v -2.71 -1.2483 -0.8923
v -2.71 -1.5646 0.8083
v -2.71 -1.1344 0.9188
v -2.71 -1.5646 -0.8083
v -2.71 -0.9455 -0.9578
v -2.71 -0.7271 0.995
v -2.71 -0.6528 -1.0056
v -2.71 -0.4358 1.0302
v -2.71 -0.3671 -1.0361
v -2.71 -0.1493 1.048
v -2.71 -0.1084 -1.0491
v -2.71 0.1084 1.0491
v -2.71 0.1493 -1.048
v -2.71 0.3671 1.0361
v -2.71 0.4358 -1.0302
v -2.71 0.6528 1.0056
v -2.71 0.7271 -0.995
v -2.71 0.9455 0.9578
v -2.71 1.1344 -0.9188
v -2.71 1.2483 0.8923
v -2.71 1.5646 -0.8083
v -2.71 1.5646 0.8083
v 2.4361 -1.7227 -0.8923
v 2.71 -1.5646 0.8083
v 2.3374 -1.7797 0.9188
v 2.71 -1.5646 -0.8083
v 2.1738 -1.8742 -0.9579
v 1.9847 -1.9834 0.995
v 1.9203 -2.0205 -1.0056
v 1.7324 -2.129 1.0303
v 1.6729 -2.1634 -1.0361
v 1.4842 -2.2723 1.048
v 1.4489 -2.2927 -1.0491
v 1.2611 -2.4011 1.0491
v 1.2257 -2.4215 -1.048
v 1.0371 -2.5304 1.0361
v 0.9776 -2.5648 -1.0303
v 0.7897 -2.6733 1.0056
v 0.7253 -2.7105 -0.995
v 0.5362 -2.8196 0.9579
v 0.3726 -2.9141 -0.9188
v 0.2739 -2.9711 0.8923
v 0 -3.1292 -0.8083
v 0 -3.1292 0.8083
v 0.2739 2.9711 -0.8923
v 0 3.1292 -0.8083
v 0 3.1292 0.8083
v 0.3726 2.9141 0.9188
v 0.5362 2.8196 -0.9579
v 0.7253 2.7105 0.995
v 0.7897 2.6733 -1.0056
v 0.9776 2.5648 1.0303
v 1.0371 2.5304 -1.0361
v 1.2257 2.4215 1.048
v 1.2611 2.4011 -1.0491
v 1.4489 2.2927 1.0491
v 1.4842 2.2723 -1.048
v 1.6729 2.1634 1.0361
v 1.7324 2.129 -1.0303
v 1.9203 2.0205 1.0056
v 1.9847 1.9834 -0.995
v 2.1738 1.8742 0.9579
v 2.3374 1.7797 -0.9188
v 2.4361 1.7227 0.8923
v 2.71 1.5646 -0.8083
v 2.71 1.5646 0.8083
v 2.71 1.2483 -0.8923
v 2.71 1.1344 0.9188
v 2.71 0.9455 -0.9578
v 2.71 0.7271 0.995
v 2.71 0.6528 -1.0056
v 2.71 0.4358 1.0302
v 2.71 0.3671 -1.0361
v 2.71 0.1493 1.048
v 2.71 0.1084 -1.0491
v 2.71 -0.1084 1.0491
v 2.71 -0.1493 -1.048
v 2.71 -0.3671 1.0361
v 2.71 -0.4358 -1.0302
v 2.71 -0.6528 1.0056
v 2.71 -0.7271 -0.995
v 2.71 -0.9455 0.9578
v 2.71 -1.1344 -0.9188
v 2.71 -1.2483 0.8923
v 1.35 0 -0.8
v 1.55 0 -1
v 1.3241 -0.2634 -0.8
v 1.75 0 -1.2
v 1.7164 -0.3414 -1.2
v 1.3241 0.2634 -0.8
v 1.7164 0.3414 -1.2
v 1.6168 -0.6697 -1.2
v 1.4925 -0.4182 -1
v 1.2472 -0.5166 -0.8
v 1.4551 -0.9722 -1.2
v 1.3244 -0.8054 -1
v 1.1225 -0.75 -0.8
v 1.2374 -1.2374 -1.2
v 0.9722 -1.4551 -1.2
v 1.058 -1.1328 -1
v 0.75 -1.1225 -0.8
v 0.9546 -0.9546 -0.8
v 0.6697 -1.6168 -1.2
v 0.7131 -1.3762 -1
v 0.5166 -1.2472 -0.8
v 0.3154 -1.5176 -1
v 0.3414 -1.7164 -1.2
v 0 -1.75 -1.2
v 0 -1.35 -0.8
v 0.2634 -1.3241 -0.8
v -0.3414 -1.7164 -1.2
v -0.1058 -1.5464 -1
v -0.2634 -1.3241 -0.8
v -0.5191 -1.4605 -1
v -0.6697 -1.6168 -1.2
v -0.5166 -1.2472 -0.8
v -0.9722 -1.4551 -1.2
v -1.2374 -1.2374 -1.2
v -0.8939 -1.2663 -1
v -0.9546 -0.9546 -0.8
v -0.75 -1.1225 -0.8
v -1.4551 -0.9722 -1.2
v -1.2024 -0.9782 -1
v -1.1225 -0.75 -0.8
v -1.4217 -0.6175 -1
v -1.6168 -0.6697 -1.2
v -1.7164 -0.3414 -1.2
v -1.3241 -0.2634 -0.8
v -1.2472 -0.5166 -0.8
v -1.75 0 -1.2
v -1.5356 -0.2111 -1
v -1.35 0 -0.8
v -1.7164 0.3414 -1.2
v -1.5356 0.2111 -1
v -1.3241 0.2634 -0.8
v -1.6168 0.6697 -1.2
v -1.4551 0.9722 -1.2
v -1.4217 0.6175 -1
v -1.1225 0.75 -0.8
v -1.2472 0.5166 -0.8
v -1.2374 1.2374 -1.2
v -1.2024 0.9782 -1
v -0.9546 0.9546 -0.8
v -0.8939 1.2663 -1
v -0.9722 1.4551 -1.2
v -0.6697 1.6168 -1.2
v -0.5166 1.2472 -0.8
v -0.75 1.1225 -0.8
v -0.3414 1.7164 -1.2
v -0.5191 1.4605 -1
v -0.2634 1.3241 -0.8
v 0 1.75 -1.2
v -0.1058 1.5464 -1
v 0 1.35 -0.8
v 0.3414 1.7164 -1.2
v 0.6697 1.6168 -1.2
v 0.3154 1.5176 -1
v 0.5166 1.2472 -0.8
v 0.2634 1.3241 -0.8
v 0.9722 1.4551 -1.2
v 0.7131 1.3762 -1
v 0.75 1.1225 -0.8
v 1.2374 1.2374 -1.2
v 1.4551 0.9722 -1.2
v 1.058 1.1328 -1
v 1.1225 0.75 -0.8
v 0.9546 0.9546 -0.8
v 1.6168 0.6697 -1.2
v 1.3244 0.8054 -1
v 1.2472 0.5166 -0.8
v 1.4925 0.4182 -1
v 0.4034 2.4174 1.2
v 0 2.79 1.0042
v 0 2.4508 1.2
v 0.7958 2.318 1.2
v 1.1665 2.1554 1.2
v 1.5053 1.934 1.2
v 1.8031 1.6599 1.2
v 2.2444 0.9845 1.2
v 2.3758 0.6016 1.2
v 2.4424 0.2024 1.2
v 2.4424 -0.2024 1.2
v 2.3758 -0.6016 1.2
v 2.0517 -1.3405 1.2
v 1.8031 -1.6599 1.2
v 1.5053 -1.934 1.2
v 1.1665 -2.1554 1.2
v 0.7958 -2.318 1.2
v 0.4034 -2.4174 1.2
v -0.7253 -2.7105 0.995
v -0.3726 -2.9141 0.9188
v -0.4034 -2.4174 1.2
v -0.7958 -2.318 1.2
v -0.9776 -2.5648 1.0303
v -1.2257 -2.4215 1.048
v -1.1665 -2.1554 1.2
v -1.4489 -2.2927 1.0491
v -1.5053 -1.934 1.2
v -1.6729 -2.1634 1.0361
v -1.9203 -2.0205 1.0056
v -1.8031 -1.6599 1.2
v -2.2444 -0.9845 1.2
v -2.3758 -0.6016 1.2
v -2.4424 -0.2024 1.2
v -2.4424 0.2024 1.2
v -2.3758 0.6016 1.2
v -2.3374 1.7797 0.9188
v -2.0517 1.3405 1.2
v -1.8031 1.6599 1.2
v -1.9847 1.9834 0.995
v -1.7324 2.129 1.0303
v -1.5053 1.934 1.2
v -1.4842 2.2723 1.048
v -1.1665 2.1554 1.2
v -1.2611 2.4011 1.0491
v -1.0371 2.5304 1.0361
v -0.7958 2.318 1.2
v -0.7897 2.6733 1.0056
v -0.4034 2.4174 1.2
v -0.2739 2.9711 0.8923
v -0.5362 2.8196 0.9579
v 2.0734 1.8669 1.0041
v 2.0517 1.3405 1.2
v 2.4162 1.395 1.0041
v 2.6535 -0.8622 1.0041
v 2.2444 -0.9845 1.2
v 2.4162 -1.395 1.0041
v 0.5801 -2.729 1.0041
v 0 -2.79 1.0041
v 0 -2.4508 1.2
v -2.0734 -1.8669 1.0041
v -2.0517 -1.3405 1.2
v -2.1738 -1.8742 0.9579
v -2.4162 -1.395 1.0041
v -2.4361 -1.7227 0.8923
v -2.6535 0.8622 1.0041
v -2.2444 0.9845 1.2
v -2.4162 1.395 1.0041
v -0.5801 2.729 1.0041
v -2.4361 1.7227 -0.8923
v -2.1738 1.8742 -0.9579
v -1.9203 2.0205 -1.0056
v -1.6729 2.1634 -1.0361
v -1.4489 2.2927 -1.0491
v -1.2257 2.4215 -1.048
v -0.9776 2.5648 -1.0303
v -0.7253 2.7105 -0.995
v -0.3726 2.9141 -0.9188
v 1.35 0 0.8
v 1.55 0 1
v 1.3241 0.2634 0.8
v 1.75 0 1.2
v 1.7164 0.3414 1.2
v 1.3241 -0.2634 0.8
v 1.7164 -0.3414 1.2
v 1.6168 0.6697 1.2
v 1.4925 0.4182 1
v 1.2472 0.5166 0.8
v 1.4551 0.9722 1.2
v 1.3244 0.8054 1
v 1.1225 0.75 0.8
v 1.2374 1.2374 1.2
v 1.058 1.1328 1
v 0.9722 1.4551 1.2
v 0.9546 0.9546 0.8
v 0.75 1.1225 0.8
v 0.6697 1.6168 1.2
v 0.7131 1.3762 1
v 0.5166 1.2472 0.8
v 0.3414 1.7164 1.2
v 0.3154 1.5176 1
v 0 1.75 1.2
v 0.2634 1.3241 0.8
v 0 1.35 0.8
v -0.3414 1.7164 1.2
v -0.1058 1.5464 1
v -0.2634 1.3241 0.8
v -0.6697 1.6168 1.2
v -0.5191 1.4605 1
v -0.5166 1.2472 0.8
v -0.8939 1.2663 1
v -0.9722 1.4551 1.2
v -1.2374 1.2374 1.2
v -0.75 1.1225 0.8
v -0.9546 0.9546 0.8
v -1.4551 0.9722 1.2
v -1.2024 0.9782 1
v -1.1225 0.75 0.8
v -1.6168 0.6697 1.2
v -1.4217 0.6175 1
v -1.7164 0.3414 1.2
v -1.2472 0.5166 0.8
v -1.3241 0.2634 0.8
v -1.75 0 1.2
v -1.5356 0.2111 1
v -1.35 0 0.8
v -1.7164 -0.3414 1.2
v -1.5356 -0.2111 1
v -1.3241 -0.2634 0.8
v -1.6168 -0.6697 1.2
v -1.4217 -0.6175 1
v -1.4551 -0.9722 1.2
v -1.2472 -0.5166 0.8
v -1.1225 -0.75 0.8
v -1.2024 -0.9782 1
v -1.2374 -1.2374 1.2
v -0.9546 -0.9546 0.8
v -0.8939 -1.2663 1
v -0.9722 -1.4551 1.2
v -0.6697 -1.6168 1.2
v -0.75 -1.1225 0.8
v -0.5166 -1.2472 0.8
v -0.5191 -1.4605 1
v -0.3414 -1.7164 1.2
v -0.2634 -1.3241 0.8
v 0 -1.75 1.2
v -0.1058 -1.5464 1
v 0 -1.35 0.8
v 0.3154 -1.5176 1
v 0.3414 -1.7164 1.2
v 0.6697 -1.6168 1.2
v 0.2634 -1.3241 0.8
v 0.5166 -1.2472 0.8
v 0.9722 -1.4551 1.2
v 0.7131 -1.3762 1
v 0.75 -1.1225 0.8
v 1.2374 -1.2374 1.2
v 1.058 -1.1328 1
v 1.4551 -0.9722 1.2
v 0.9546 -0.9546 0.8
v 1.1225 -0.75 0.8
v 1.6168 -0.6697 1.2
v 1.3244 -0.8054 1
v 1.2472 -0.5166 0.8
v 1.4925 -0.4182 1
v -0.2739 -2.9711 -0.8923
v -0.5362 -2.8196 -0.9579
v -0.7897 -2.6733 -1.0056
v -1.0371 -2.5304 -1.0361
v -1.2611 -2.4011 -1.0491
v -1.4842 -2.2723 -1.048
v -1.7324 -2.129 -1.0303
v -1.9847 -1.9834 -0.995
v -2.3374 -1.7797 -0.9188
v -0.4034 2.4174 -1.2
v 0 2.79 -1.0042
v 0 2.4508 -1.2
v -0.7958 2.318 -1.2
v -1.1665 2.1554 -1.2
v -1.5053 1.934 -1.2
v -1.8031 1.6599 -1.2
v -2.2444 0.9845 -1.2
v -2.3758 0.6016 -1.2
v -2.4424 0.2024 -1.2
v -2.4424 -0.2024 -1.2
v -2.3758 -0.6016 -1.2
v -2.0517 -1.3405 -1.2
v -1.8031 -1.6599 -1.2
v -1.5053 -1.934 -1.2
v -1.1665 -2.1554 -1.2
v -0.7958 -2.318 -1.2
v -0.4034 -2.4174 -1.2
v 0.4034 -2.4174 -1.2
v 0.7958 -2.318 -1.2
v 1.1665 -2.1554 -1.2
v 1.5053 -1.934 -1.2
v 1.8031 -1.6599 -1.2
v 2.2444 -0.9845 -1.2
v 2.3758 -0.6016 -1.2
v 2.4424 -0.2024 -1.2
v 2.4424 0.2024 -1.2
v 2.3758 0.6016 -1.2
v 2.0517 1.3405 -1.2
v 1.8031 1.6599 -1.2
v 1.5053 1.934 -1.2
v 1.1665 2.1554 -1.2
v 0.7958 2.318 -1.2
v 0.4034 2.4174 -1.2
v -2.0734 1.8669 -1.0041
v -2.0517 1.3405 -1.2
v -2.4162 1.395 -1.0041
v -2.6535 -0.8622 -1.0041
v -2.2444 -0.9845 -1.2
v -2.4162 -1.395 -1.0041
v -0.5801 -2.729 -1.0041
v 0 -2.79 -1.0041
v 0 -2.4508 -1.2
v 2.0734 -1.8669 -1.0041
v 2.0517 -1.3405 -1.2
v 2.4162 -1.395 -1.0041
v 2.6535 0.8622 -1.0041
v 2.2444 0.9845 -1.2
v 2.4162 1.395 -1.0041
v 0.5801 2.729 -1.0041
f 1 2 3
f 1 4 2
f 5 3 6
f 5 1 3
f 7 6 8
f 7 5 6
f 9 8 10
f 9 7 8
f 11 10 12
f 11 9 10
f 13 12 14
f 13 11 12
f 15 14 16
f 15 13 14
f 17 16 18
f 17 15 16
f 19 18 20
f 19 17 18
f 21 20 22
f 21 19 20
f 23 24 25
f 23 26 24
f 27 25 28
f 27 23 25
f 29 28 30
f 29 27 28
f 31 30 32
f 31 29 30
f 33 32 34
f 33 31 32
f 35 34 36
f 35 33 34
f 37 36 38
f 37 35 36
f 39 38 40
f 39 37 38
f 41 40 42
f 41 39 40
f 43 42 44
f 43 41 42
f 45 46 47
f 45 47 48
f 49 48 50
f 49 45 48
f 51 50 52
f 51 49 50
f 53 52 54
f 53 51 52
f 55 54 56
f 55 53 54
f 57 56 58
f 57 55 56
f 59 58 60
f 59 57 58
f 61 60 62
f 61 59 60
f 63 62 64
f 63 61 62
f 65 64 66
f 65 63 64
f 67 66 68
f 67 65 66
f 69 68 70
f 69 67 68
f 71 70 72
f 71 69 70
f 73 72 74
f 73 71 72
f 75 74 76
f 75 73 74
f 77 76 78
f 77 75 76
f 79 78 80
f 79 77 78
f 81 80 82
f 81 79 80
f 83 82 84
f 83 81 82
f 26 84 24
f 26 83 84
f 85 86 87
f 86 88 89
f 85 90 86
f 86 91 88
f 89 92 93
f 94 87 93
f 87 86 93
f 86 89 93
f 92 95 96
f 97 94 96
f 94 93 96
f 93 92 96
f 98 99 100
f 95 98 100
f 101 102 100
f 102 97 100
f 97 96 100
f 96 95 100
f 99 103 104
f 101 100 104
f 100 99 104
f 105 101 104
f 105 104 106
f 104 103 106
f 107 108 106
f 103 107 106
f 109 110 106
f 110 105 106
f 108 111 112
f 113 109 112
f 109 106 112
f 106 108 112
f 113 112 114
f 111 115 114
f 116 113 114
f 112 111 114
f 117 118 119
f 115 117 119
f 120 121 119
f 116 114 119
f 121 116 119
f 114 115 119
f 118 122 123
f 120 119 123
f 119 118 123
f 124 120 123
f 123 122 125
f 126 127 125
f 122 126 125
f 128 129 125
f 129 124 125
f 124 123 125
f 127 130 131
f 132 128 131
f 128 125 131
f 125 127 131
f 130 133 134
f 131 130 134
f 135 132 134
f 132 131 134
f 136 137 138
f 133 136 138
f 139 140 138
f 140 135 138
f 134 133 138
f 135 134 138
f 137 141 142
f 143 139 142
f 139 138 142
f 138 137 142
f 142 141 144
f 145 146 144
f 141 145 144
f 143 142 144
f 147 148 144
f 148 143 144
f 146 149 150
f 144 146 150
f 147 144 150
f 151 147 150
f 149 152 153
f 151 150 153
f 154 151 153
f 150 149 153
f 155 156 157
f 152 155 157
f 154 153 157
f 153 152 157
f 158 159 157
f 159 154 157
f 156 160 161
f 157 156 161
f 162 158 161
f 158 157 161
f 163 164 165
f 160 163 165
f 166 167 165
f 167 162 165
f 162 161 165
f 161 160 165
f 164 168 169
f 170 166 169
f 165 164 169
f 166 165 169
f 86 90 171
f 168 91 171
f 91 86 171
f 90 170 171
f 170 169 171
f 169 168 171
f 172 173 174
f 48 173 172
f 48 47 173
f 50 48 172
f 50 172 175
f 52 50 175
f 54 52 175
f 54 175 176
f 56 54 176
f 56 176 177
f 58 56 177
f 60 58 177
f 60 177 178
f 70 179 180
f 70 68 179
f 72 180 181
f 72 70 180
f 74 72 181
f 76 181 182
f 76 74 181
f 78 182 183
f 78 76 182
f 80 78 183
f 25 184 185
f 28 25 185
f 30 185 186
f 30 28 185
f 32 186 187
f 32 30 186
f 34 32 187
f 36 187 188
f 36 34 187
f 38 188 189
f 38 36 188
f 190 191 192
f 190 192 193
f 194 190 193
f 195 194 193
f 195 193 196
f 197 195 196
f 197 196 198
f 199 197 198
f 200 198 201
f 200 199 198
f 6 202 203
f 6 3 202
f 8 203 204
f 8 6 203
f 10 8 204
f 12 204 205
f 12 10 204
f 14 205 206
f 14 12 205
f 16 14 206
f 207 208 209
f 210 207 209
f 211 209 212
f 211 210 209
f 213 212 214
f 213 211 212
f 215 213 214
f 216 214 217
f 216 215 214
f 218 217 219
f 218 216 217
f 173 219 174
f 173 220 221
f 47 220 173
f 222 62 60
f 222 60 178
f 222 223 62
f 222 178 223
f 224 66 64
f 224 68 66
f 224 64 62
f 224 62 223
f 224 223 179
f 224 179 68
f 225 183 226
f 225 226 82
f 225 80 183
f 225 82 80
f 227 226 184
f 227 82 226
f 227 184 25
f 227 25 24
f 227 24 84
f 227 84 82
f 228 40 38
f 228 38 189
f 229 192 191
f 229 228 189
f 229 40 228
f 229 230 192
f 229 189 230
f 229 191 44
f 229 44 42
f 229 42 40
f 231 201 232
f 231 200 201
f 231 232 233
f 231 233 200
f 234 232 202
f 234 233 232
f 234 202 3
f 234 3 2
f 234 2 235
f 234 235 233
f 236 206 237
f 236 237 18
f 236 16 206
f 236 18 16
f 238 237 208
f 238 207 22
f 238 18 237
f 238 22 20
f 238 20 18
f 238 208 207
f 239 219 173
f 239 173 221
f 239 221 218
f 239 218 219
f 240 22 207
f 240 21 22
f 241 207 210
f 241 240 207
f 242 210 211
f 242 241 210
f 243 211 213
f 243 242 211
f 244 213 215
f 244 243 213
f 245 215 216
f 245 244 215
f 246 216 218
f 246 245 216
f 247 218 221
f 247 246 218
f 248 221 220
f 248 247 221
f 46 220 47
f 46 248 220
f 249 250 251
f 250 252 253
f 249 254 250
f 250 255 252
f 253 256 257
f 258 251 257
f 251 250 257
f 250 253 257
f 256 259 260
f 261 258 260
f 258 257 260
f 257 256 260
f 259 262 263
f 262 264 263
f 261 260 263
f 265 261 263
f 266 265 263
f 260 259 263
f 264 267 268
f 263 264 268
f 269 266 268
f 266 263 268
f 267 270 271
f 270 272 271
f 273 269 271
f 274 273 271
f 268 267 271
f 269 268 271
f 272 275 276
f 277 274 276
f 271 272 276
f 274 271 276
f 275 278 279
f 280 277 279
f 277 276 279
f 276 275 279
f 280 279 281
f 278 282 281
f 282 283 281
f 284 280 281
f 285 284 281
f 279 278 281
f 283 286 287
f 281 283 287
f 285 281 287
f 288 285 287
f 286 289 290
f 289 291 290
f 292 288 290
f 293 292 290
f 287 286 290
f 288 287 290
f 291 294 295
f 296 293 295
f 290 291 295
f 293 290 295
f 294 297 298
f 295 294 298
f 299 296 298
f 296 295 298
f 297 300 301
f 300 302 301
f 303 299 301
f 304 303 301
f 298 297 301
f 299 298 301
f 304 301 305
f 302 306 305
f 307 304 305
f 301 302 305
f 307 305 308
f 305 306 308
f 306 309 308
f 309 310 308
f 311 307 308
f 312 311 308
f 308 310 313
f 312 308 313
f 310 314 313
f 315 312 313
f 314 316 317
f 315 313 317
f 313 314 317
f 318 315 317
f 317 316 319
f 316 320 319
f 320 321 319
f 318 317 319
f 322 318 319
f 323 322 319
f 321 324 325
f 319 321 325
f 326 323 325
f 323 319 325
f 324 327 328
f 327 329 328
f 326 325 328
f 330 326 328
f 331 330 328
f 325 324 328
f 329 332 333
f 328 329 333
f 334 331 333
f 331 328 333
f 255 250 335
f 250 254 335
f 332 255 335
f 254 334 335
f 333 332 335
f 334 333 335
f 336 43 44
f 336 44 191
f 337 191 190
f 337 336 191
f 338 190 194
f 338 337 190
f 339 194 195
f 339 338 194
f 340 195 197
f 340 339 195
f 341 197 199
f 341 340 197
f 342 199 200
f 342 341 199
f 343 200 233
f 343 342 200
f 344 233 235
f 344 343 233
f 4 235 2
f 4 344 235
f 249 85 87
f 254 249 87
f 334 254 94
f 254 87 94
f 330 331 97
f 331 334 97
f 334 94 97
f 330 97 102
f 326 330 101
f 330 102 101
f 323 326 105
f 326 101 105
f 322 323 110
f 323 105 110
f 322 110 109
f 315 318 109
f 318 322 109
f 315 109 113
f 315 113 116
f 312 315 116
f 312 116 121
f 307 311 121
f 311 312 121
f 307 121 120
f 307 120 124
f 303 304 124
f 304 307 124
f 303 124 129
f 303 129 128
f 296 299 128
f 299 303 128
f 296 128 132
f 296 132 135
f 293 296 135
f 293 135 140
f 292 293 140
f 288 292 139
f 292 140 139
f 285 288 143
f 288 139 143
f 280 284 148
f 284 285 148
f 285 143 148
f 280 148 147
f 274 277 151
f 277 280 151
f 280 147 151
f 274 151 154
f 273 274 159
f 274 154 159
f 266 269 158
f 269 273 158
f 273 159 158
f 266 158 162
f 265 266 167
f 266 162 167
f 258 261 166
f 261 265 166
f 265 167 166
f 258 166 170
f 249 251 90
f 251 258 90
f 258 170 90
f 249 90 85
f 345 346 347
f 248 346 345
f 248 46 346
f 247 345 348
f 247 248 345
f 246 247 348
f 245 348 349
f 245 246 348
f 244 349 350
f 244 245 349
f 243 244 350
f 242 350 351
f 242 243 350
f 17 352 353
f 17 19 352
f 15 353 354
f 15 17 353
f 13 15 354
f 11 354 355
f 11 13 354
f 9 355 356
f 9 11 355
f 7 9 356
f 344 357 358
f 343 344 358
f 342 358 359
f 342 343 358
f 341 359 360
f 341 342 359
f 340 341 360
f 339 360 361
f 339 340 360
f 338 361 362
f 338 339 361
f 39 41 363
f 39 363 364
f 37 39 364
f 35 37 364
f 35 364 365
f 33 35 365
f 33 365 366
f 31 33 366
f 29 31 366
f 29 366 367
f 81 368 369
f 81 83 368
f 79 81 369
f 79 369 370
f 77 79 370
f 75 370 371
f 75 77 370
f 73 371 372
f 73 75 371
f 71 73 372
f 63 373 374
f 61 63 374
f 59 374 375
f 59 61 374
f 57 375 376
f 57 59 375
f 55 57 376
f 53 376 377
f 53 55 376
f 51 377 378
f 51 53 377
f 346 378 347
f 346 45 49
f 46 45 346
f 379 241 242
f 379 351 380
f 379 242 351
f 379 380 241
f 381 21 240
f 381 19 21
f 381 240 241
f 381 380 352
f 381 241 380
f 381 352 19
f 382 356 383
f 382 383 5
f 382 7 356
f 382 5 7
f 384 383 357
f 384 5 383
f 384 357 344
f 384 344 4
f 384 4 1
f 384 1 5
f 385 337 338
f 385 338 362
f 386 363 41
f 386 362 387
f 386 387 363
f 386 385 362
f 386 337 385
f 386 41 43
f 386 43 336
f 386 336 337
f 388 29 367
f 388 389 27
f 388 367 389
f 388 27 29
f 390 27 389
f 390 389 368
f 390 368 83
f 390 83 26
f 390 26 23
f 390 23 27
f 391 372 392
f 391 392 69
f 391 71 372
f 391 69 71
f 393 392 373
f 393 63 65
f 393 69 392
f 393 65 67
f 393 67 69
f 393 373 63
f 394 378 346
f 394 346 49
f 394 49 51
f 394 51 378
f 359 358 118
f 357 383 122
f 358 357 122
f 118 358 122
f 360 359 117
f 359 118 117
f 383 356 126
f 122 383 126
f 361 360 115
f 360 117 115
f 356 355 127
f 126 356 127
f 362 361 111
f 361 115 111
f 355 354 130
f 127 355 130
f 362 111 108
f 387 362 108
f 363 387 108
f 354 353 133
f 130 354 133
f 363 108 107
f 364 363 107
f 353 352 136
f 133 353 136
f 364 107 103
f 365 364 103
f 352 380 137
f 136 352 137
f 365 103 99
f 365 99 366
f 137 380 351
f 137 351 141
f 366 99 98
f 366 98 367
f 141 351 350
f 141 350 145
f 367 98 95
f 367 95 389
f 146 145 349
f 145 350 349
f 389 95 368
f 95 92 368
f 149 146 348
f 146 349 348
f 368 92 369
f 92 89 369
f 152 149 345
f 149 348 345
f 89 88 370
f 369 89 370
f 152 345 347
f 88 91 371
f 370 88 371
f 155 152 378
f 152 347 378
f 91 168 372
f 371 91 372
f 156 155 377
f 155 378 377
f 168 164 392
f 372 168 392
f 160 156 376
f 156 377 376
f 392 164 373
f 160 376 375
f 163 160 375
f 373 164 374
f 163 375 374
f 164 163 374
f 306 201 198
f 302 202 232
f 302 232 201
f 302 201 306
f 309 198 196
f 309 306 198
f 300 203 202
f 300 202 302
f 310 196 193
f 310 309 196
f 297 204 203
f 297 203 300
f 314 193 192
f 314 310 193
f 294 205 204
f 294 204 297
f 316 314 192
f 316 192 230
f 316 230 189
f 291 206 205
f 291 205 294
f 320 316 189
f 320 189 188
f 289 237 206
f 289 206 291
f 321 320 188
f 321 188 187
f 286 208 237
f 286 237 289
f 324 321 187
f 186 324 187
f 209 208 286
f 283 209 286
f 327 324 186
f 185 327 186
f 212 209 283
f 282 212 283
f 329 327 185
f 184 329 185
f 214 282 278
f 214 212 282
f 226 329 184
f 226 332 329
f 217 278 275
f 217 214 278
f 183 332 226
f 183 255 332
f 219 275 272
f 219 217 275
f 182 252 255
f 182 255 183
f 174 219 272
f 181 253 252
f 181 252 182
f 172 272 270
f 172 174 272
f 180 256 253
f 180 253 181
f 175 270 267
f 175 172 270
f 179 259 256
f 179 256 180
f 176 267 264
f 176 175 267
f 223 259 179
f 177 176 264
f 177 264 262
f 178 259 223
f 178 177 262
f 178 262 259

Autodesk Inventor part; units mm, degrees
ref_plane "YZ Plane" through (0, 0, 0) normal (1, 0, 0) x (0, 1, 0)
ref_plane "XZ Plane" through (0, 0, 0) normal (0, 1, 0) x (-1, 0, 0)
ref_plane "XY Plane" through (0, 0, 0) normal (0, 0, 1) x (1, 0, 0)
sketch "Эскиз1" plane through (0, 0, 0) normal (0, 0, 1) x (1, 0, 0)
  circle A0 centre (0, 0) radius 1.35
  line L0 (0, 3.1292) -> (2.71, 1.5646)
  line L1 (2.71, 1.5646) -> (2.71, -1.5646)
  line L2 (2.71, -1.5646) -> (0, -3.1292)
  line L3 (0, -3.1292) -> (-2.71, -1.5646)
  line L4 (-2.71, -1.5646) -> (-2.71, 1.5646)
  line L5 (-2.71, 1.5646) -> (0, 3.1292)
  dimension "d0" = 2.7
  dimension "d1" = 5.42
extrude "Выдавливание1" add sketch "Эскиз1" along normal mid plane 2.4
chamfer "Фаска1" distance 0.4 angle 45 2 edges at (-1.35, 0, 1.2) (-1.35, 0, -1.2)
sketch "Эскиз2" plane through (0, 0, 0) normal (1, 0, 0) x (0, 1, 0)
  line L0 (0, -4.7585) -> (0, 2.7781)
  line L1 (3.1292, -1.2) -> (3.1292, 1.2) projected
  line L2 (1.5646, 1.2) -> (3.1292, 1.2) projected
  line L3 (1.5646, -1.2) -> (1.5646, 1.2) projected
  line L4 (3.1292, -1.2) -> (1.5646, -1.2) projected
  line L5 (3.1292, 0.8083) -> (2.4508, 1.2)
  point P0 (0, 0)
  dimension "d7" = 30
revolve "Вращение1" cut sketch "Эскиз2" angle 360 about axis through (0, 0, -4.7585) along (0, 0, 1) contours L5 L2 L1
mirror "Зеркальное отражение1" about plane through (0, 0, 0) normal (0, 0, 1) of "Вращение1"
properties part number "Гайка М3"
